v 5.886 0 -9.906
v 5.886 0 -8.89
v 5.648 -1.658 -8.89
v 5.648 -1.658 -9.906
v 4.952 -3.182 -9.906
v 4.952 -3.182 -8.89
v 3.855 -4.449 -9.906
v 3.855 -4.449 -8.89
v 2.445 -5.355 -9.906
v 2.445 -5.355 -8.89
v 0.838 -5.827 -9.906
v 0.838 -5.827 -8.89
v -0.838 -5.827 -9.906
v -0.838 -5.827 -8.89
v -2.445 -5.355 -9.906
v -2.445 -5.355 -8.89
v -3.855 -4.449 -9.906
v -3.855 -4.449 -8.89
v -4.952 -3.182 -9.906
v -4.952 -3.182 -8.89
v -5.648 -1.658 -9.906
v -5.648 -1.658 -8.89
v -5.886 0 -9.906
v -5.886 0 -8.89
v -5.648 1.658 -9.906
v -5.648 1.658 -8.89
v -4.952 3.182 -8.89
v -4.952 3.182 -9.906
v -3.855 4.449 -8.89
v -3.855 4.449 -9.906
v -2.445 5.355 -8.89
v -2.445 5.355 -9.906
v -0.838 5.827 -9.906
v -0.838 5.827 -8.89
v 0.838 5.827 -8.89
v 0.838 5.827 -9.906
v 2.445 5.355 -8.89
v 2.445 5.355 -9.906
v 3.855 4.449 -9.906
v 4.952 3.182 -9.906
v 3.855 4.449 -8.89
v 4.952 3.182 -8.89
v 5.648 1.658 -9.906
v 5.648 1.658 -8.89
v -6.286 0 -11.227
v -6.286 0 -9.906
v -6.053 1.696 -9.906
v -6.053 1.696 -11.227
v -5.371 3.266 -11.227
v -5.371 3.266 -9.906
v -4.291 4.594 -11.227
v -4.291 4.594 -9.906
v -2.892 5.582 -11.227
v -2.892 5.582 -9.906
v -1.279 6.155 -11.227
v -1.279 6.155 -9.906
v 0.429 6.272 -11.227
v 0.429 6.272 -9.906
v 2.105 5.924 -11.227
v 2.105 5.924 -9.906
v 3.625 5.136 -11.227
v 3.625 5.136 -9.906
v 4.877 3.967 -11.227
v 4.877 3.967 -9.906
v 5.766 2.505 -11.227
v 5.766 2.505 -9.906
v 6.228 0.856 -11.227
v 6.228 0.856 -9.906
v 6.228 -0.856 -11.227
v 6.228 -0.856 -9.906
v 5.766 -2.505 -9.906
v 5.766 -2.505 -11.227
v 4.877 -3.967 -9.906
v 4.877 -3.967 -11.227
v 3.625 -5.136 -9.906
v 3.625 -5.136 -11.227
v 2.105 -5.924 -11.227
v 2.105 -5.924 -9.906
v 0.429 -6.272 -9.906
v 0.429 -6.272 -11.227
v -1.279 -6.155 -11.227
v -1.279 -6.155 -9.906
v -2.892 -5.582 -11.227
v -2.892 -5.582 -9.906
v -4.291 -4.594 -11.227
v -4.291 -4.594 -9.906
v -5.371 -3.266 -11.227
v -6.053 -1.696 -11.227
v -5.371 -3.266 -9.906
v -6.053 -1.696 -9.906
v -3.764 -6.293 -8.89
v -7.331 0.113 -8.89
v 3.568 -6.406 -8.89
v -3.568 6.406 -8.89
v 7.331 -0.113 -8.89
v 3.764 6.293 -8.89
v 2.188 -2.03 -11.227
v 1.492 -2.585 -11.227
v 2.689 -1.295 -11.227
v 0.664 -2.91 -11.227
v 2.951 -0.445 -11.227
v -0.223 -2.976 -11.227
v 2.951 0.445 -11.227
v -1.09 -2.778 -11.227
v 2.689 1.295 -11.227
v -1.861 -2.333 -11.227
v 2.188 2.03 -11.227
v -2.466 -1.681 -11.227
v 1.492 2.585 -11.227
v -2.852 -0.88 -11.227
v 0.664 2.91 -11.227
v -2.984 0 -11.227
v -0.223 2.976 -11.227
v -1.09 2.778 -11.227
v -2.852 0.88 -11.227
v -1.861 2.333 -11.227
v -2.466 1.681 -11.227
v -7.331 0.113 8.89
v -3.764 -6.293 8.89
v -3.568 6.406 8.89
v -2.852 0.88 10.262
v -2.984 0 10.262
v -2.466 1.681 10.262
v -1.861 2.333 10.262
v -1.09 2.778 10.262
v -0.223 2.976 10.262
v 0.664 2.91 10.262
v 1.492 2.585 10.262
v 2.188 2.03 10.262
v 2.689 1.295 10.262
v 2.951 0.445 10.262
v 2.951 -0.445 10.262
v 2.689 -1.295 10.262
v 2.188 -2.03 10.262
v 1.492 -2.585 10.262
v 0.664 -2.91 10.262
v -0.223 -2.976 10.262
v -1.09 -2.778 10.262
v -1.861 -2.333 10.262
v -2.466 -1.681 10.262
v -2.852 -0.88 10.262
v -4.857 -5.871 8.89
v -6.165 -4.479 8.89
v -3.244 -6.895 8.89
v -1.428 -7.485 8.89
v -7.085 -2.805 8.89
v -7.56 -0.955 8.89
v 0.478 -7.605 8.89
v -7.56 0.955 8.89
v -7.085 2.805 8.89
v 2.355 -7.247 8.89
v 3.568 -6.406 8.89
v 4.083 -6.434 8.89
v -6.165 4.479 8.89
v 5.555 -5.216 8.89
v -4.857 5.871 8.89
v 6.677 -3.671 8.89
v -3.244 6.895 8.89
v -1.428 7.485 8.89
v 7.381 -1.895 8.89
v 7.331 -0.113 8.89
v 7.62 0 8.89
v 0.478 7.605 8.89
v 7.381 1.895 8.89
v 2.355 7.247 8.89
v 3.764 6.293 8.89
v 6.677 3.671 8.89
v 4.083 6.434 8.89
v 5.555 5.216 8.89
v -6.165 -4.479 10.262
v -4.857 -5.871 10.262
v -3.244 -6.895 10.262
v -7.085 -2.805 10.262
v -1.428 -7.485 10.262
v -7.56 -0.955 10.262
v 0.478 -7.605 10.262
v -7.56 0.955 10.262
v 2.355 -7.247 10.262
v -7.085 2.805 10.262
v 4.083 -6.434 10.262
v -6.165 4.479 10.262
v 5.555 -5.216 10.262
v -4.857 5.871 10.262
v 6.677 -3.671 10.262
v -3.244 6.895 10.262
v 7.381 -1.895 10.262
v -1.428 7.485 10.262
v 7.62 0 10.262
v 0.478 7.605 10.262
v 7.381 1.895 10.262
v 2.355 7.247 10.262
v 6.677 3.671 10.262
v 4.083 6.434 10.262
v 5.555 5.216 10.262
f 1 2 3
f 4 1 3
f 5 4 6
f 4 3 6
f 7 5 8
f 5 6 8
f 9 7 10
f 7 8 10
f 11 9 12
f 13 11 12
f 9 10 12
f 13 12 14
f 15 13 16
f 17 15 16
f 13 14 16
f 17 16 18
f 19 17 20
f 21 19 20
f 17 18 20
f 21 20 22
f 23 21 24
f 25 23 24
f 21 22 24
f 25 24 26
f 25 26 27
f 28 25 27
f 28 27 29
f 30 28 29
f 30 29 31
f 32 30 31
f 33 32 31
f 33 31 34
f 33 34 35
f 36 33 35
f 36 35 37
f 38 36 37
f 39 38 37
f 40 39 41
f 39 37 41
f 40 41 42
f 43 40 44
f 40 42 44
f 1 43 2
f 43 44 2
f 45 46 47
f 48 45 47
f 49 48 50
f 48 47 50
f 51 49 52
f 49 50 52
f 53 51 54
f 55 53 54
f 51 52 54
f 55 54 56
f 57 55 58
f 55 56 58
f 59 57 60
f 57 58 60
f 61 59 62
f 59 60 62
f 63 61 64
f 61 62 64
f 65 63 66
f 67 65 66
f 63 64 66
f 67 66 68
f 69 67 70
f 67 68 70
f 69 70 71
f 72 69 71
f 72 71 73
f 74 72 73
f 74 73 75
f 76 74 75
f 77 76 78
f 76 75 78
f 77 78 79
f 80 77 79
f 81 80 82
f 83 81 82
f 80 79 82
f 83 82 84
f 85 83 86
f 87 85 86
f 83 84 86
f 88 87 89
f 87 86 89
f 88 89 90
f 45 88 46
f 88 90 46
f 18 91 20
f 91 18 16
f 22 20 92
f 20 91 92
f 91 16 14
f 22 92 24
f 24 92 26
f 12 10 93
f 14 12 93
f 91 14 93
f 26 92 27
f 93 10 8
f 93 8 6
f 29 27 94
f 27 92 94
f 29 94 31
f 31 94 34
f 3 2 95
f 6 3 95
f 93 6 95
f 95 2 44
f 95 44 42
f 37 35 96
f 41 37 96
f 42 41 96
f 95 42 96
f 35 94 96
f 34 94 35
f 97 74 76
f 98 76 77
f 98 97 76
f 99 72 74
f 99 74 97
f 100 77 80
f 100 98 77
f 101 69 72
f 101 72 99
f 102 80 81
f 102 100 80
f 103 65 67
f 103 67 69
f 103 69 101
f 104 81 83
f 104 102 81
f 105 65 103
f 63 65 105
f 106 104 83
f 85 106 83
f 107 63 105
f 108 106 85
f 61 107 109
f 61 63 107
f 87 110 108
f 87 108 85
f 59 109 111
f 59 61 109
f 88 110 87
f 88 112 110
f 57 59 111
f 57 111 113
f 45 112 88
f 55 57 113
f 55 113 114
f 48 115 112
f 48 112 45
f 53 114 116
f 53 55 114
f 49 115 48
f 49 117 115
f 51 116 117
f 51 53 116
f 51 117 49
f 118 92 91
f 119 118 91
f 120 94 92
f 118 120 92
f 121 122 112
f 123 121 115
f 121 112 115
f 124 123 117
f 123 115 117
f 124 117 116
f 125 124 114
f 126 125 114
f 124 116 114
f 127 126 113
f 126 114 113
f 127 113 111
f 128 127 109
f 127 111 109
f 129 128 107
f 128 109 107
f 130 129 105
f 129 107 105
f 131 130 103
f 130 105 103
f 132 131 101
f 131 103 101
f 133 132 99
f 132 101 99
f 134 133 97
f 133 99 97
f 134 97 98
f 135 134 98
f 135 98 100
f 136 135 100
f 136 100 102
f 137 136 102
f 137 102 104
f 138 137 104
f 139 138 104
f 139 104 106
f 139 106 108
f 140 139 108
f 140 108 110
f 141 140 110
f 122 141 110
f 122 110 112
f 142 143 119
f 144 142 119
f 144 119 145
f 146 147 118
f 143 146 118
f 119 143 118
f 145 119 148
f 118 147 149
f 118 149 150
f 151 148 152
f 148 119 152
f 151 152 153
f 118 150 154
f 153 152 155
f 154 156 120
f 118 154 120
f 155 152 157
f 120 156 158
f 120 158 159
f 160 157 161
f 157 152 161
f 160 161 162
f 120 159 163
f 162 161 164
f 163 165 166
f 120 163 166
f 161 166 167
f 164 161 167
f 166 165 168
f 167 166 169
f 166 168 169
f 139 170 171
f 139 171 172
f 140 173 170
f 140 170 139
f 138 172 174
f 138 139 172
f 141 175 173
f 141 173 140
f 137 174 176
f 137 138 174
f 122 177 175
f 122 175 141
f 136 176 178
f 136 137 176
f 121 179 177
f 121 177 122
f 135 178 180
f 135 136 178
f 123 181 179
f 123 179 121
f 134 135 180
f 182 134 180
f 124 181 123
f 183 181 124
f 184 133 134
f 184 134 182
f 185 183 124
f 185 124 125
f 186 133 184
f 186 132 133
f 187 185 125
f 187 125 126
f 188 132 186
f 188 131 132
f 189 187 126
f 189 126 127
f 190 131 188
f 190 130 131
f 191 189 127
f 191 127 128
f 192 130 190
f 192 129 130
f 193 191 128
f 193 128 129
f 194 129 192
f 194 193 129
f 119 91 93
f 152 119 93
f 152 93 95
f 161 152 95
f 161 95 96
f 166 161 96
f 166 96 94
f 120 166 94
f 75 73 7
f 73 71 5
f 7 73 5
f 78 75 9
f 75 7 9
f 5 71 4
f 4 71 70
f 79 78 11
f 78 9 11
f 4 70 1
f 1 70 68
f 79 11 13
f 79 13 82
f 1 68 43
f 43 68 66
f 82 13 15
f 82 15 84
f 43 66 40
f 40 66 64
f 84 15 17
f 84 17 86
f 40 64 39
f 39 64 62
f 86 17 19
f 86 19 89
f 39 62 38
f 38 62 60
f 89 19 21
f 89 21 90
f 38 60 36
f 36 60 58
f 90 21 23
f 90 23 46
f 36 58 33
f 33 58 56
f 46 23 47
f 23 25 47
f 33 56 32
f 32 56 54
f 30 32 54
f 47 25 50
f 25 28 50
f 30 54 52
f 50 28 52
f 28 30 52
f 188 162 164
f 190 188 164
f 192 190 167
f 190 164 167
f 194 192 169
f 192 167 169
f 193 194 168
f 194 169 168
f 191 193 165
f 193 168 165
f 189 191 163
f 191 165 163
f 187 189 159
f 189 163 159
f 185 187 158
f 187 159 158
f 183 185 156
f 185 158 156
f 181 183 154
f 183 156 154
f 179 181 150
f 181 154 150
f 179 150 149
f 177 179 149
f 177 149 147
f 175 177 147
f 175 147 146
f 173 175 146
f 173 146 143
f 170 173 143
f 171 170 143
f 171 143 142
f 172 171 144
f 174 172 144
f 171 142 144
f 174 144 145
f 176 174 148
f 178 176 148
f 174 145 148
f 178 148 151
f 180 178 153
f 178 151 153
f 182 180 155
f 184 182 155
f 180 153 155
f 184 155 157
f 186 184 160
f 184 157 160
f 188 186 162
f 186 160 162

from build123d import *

# Parameters (mm, degrees)
BOSS_EXTRUDE1_DEPTH      = 8.89
BOSS_EXTRUDE1_DEPTH_BACK = 8.89
SKETCH2_R                = 7.62
BOSS_EXTRUDE3_DEPTH      = 1.3716
SKETCH4_R                = 5.88645
BOSS_EXTRUDE4_DEPTH      = 1.016
SKETCH5_R                = 6.2865
BOSS_EXTRUDE5_DEPTH      = 1.3208
SKETCH6_R                = 2.9845
CUT_EXTRUDE2_DEPTH       = 25.039137559


with BuildPart() as part:
    # Sketch1 → Boss-Extrude1 (new, two sides: drawn at the far end of the back side and taken through both)
    with BuildSketch(Plane.XY.offset(-BOSS_EXTRUDE1_DEPTH_BACK)):
        Polygon((3.763810109, 6.292620026), (-3.567663745, 6.405865183), (-7.331473854, 0.113245156), (-3.763810109, -6.292620026), (3.567663745, -6.405865183), (7.331473854, -0.113245156), align=None)
    extrude(amount=BOSS_EXTRUDE1_DEPTH + BOSS_EXTRUDE1_DEPTH_BACK)

    # Sketch2 → Boss-Extrude3 (add)
    with BuildSketch(Plane.XY.offset(8.89)):
        Circle(SKETCH2_R)
    extrude(amount=BOSS_EXTRUDE3_DEPTH)

    # Sketch4 → Boss-Extrude4 (add)
    with BuildSketch(Plane(origin=(0, 0, -8.89), x_dir=(-1, 0, 0), z_dir=(0, 0, -1))):
        with Locations(Location((0, 0, 0), (0, 0, 180))):
            Circle(SKETCH4_R)
    extrude(amount=BOSS_EXTRUDE4_DEPTH)

    # Sketch5 → Boss-Extrude5 (add)
    with BuildSketch(Plane(origin=(0, 0, -9.906), x_dir=(-1, 0, 0), z_dir=(0, 0, -1))):
        Circle(SKETCH5_R)
    extrude(amount=BOSS_EXTRUDE5_DEPTH)

    # Sketch6 → Cut-Extrude2 (cut, through all)
    with BuildSketch(Plane(origin=(0, 0, -11.2268), x_dir=(-1, 0, 0), z_dir=(0, 0, -1))):
        Circle(SKETCH6_R)
    extrude(amount=-CUT_EXTRUDE2_DEPTH, mode=Mode.SUBTRACT)


solid = part.part
